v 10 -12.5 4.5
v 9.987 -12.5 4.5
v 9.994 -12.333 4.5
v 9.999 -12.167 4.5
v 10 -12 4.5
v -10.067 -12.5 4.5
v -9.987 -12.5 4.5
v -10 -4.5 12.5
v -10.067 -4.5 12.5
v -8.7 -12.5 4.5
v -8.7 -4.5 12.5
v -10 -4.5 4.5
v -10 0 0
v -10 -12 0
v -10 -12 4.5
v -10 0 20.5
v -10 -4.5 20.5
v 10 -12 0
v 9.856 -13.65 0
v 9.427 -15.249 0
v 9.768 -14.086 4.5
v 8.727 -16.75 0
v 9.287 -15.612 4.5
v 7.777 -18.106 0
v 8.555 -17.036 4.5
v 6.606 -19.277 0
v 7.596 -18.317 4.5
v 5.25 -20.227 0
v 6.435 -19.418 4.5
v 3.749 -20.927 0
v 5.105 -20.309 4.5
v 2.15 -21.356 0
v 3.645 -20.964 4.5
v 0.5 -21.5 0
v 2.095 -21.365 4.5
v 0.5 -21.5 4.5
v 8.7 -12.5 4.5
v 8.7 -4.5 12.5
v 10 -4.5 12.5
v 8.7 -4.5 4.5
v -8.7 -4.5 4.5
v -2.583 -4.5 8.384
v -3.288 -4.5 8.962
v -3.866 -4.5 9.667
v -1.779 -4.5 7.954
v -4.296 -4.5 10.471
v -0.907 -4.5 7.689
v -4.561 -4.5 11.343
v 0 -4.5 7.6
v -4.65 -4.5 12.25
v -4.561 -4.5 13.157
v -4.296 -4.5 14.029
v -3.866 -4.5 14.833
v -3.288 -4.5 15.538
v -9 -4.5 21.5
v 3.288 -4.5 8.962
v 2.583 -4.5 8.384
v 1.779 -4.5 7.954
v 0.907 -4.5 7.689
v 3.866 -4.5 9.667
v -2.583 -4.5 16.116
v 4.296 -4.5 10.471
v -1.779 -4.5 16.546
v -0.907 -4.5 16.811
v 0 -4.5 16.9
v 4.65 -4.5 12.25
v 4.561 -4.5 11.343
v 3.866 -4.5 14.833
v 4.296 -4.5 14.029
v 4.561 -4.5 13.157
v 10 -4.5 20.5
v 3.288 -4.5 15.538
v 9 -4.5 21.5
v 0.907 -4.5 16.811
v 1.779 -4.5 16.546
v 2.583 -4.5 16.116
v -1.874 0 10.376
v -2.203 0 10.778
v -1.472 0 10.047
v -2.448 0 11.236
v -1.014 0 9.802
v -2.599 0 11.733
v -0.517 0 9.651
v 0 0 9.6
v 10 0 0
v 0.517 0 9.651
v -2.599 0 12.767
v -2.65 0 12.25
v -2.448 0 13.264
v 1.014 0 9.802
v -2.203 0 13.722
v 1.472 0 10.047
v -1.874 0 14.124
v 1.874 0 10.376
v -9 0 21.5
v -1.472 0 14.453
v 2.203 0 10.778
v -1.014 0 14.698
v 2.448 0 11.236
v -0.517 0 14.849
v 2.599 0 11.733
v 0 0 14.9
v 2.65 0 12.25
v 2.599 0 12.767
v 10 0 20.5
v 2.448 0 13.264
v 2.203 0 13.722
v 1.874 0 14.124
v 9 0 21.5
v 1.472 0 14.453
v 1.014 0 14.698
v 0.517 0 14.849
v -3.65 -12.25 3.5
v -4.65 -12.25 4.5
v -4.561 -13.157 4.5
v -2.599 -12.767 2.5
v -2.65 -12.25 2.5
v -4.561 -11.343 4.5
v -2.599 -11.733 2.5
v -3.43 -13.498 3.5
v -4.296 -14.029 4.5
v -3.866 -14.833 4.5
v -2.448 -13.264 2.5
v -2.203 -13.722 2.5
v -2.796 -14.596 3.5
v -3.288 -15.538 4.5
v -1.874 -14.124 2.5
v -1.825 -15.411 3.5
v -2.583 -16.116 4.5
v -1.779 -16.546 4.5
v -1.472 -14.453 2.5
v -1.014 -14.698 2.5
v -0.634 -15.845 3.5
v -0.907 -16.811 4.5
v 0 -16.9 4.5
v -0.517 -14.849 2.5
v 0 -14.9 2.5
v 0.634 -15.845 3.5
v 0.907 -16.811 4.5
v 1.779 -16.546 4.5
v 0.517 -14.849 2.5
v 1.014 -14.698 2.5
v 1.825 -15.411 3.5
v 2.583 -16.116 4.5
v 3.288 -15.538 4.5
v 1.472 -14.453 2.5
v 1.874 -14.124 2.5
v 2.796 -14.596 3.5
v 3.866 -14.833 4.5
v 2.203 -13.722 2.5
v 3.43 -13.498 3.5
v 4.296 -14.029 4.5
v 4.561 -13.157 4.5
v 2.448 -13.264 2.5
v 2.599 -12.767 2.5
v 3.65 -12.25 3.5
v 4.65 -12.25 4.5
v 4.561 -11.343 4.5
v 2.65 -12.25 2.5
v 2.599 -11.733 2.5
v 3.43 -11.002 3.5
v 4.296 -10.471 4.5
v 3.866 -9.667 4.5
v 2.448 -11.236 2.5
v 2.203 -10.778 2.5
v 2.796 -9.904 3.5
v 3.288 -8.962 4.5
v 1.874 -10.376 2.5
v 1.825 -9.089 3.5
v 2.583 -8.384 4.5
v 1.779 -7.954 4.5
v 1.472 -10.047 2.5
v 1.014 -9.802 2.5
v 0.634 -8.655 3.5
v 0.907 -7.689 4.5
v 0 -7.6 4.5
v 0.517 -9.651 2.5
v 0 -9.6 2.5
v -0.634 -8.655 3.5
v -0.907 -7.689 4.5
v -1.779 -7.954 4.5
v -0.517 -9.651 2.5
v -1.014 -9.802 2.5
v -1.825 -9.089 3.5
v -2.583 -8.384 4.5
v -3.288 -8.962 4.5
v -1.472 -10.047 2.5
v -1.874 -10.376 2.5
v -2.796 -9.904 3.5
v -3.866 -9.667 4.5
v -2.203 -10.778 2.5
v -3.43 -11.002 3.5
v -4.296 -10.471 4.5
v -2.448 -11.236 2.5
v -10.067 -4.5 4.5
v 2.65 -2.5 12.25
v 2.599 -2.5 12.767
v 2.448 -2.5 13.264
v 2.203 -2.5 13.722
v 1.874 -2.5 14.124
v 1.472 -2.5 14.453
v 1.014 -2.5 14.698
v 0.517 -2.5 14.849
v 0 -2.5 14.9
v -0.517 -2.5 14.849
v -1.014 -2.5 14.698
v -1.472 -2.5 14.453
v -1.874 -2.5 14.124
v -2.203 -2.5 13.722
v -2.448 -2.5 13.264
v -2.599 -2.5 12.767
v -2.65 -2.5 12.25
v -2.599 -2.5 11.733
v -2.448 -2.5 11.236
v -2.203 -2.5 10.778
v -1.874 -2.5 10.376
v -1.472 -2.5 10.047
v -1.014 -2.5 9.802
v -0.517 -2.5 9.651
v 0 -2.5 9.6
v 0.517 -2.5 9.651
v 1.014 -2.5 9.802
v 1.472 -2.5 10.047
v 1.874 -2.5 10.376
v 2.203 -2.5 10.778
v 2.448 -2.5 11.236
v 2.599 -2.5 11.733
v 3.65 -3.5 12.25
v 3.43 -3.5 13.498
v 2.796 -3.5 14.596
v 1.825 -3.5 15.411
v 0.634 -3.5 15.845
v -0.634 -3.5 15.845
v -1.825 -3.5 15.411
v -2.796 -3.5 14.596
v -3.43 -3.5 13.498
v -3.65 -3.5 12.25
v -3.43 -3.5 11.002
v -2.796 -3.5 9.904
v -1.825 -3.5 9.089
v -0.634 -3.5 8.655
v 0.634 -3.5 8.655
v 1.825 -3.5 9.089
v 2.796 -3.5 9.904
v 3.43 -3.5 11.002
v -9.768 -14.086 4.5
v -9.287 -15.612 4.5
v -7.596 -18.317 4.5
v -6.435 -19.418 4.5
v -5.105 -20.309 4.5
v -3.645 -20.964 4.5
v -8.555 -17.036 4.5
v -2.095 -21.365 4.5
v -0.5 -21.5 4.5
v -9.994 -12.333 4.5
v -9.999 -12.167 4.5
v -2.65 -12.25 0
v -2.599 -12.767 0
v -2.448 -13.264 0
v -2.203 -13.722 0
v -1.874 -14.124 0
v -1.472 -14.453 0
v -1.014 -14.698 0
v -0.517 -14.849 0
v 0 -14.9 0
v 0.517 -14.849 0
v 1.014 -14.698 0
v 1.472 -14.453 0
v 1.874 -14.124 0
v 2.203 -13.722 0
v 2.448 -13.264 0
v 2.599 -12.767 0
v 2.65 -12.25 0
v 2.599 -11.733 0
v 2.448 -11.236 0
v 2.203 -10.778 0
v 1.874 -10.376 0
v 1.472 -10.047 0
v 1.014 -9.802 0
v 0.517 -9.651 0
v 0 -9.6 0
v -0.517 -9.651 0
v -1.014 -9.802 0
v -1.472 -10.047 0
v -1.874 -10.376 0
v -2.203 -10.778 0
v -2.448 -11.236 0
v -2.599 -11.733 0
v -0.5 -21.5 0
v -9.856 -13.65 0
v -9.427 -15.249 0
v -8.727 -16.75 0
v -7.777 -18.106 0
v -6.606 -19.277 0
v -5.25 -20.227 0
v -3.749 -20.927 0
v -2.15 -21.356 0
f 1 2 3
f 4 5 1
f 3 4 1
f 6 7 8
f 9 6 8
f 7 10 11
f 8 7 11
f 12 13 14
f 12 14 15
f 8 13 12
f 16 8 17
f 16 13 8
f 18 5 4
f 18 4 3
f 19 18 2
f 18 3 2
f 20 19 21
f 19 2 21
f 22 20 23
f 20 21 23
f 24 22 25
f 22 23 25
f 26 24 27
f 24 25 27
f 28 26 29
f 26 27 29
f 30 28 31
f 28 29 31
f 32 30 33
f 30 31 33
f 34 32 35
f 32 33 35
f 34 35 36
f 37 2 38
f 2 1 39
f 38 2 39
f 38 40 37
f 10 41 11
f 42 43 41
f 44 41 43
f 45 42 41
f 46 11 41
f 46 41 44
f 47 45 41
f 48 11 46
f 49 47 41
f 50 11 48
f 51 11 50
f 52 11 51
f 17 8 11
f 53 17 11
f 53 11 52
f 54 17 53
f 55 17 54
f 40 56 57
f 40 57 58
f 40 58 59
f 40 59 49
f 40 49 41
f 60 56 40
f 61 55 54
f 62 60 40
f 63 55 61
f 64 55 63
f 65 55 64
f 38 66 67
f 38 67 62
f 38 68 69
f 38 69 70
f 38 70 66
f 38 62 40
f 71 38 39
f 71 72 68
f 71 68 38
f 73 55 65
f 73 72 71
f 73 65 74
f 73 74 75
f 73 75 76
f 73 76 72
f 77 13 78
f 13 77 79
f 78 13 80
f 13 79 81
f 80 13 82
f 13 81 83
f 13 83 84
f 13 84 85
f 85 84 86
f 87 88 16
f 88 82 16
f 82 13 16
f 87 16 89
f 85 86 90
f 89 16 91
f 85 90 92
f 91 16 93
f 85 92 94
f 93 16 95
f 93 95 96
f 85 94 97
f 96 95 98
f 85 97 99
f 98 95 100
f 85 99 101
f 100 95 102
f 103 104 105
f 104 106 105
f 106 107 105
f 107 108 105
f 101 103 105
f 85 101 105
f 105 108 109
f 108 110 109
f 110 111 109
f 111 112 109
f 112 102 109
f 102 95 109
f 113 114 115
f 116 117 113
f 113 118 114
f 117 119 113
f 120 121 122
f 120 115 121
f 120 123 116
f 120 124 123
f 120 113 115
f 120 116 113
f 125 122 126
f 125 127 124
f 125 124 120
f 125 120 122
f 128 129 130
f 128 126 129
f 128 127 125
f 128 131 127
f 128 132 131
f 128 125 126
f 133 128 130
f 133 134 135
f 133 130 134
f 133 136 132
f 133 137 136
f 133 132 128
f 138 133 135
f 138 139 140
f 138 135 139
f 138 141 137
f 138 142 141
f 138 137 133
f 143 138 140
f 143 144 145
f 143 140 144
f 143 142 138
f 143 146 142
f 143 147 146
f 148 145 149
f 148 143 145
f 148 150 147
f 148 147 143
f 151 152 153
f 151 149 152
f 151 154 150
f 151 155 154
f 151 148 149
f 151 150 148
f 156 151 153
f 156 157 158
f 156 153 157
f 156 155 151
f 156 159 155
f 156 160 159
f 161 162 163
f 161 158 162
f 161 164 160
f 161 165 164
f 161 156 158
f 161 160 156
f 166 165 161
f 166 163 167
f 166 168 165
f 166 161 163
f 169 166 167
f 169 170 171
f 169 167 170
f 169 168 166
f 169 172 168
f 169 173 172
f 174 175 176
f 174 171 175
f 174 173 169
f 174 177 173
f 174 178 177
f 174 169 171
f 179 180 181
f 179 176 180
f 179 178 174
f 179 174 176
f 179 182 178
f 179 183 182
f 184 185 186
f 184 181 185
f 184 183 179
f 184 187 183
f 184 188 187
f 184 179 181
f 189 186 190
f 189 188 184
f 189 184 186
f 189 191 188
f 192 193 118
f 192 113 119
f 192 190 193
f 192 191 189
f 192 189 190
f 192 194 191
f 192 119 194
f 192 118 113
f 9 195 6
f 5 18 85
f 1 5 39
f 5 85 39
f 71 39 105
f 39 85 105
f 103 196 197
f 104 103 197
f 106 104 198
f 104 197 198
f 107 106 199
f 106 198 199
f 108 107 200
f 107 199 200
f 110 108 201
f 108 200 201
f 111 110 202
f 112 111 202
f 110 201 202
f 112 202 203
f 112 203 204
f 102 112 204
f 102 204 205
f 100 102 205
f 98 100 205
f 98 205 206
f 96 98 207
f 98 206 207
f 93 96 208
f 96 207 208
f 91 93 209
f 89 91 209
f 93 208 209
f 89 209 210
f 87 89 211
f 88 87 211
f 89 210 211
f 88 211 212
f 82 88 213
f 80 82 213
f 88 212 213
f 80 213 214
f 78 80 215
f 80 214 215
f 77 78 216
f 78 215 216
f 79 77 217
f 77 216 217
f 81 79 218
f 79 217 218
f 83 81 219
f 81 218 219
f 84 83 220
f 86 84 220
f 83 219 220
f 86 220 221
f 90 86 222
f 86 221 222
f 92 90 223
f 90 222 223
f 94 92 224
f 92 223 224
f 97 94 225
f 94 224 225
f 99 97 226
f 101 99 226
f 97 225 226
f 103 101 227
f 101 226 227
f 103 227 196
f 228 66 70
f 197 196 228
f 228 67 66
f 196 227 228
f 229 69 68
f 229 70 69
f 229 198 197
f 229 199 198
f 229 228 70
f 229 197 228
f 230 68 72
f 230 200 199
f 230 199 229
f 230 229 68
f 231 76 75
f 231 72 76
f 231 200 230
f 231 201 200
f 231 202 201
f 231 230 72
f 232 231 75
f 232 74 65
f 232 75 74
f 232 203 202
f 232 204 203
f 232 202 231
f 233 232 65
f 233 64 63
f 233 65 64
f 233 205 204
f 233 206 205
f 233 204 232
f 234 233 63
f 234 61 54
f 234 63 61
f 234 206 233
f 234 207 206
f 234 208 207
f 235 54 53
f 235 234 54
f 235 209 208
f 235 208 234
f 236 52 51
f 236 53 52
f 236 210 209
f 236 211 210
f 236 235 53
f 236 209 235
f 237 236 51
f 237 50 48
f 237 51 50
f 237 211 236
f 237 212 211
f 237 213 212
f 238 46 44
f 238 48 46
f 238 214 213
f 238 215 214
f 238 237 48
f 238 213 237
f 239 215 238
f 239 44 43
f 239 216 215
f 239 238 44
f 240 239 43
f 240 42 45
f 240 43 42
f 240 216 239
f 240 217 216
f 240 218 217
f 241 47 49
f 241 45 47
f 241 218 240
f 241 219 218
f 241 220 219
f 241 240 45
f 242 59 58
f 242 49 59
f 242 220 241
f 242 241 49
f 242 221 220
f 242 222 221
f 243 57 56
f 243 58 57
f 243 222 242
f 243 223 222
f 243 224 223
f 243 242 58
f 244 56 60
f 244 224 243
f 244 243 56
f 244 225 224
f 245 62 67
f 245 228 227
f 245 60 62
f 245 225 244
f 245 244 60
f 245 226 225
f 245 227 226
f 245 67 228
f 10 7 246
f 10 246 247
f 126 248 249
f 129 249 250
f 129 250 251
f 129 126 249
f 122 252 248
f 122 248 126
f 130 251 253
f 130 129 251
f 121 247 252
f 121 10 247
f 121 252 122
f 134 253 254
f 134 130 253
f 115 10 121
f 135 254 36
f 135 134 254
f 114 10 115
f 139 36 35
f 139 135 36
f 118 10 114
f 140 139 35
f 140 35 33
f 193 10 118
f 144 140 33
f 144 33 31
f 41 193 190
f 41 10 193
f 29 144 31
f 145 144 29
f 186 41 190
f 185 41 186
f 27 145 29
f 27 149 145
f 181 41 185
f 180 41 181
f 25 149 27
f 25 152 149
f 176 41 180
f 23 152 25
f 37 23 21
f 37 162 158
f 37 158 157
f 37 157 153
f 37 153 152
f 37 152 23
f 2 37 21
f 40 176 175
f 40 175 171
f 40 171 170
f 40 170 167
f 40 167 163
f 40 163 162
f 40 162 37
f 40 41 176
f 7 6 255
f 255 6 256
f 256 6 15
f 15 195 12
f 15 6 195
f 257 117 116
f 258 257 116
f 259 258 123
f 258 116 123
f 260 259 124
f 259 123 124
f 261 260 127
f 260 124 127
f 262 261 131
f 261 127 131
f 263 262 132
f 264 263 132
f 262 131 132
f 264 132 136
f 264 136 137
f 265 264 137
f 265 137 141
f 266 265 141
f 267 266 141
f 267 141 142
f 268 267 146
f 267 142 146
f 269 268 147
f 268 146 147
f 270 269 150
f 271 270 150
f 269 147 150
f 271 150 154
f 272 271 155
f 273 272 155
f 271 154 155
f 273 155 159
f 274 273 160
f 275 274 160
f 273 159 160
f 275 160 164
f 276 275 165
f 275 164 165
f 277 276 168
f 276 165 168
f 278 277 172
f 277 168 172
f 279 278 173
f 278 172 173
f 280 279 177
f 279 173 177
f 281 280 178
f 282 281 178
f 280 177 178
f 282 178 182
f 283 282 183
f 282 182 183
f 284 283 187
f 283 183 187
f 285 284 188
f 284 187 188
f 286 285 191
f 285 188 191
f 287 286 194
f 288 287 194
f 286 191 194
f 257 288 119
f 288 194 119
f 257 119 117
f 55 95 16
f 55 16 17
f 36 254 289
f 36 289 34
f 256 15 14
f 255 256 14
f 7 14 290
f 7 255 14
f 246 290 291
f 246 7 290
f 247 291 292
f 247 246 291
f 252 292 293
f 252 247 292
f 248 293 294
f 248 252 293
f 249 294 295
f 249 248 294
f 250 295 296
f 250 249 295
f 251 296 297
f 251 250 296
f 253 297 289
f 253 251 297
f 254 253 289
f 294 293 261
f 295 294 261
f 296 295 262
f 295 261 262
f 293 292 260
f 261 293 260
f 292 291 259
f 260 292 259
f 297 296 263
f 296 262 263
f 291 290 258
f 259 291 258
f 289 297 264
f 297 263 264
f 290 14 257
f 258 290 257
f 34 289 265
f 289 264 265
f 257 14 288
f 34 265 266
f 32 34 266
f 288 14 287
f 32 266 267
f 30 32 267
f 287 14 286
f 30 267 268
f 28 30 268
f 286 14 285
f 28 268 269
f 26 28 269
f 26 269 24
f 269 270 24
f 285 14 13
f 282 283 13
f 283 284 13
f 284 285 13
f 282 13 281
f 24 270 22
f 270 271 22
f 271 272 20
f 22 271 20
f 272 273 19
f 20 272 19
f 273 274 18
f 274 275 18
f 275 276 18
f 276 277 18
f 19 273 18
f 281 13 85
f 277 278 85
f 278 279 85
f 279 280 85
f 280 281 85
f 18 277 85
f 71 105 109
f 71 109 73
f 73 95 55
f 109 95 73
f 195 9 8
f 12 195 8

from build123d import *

# Parameters (mm, degrees)
SKETCH_W        = 20
SKETCH_H        = 21.5
PAD_DEPTH       = 21.5
FILLET_R        = 9.5
BOX_W           = 22
BOX_H           = 22
BOX_DEPTH       = 22
SKETCH001_R     = 2.65
POCKET_DEPTH    = 4.5
SKETCH002_R     = 2.65
POCKET001_DEPTH = 4.5
CHAMFER_SIZE    = 2
CHAMFER001_SIZE = 1
SKETCH003_W     = 1.3
SKETCH003_H     = 8
SKETCH003_W_2   = 1.36674
PAD001_DEPTH    = 8
POCKET002_DEPTH = 20.06774


with BuildPart() as part:
    # Sketch → Pad (new body)
    with BuildSketch(Plane.XZ):
        with Locations((0, 10.75)):
            Rectangle(SKETCH_W, SKETCH_H)
    extrude(amount=PAD_DEPTH)

    # Fillet
    fillet_edges = [part.edges().sort_by_distance(p)[0] for p in [
        (10, -21.5, 10.75),
        (-10, -21.5, 10.75),
    ]]
    fillet(fillet_edges, radius=FILLET_R)

    # Box → Box (cut)
    with BuildSketch(Plane(origin=(-11, -4.5, 4.5), x_dir=(1, 0, 0), z_dir=(0, -1, 0))):
        with Locations((11, 11)):
            Rectangle(BOX_W, BOX_H)
    extrude(amount=BOX_DEPTH, mode=Mode.SUBTRACT)

    # Sketch001 (on Face6 of Box) → Pocket (cut)
    with BuildSketch(Plane(origin=(0, -4.5, 12.25), x_dir=(1, 0, 0), z_dir=(0, -1, 0))):
        Circle(SKETCH001_R)
    extrude(amount=-POCKET_DEPTH, mode=Mode.SUBTRACT)

    # Sketch002 (on Face5 of Pocket) → Pocket001 (cut)
    with BuildSketch(Plane(origin=(0, -12.25, 4.5), x_dir=(-1, 0, 0), z_dir=(0, 0, 1))):
        Circle(SKETCH002_R)
    extrude(amount=-POCKET001_DEPTH, mode=Mode.SUBTRACT)

    # Chamfer
    chamfer_edges = [part.edges().sort_by_distance(p)[0] for p in [
        (-2.65, -4.5, 12.25),
        (2.65, -12.25, 4.5),
    ]]
    chamfer(chamfer_edges, length=CHAMFER_SIZE)

    # Chamfer001
    chamfer001_edges = [part.edges().sort_by_distance(p)[0] for p in [
        (10, -2.25, 21.5),
        (-10, -2.25, 21.5),
    ]]
    chamfer(chamfer001_edges, length=CHAMFER001_SIZE)

    # Sketch003 (on Face1 of Chamfer001) → Pad001 (join)
    with BuildSketch(Plane(origin=(0, -4.5, 4.5), x_dir=(1, 0, 0), z_dir=(0, -1, 0))):
        with Locations((9.35, 4)):
            Rectangle(SKETCH003_W, SKETCH003_H)
        with Locations((-9.38337, 4)):
            Rectangle(SKETCH003_W_2, SKETCH003_H)
    extrude(amount=PAD001_DEPTH)

    # Sketch004 (on Face26 of Pad001) → Pocket002 (cut, through all)
    with BuildSketch(Plane(origin=(10, -4.5, 4.5), x_dir=(0, 0, 1), z_dir=(1, 0, 0))):
        Polygon((0, 8), (8, 0), (8, 8), align=None)
    extrude(amount=-POCKET002_DEPTH, mode=Mode.SUBTRACT)


solid = part.part
